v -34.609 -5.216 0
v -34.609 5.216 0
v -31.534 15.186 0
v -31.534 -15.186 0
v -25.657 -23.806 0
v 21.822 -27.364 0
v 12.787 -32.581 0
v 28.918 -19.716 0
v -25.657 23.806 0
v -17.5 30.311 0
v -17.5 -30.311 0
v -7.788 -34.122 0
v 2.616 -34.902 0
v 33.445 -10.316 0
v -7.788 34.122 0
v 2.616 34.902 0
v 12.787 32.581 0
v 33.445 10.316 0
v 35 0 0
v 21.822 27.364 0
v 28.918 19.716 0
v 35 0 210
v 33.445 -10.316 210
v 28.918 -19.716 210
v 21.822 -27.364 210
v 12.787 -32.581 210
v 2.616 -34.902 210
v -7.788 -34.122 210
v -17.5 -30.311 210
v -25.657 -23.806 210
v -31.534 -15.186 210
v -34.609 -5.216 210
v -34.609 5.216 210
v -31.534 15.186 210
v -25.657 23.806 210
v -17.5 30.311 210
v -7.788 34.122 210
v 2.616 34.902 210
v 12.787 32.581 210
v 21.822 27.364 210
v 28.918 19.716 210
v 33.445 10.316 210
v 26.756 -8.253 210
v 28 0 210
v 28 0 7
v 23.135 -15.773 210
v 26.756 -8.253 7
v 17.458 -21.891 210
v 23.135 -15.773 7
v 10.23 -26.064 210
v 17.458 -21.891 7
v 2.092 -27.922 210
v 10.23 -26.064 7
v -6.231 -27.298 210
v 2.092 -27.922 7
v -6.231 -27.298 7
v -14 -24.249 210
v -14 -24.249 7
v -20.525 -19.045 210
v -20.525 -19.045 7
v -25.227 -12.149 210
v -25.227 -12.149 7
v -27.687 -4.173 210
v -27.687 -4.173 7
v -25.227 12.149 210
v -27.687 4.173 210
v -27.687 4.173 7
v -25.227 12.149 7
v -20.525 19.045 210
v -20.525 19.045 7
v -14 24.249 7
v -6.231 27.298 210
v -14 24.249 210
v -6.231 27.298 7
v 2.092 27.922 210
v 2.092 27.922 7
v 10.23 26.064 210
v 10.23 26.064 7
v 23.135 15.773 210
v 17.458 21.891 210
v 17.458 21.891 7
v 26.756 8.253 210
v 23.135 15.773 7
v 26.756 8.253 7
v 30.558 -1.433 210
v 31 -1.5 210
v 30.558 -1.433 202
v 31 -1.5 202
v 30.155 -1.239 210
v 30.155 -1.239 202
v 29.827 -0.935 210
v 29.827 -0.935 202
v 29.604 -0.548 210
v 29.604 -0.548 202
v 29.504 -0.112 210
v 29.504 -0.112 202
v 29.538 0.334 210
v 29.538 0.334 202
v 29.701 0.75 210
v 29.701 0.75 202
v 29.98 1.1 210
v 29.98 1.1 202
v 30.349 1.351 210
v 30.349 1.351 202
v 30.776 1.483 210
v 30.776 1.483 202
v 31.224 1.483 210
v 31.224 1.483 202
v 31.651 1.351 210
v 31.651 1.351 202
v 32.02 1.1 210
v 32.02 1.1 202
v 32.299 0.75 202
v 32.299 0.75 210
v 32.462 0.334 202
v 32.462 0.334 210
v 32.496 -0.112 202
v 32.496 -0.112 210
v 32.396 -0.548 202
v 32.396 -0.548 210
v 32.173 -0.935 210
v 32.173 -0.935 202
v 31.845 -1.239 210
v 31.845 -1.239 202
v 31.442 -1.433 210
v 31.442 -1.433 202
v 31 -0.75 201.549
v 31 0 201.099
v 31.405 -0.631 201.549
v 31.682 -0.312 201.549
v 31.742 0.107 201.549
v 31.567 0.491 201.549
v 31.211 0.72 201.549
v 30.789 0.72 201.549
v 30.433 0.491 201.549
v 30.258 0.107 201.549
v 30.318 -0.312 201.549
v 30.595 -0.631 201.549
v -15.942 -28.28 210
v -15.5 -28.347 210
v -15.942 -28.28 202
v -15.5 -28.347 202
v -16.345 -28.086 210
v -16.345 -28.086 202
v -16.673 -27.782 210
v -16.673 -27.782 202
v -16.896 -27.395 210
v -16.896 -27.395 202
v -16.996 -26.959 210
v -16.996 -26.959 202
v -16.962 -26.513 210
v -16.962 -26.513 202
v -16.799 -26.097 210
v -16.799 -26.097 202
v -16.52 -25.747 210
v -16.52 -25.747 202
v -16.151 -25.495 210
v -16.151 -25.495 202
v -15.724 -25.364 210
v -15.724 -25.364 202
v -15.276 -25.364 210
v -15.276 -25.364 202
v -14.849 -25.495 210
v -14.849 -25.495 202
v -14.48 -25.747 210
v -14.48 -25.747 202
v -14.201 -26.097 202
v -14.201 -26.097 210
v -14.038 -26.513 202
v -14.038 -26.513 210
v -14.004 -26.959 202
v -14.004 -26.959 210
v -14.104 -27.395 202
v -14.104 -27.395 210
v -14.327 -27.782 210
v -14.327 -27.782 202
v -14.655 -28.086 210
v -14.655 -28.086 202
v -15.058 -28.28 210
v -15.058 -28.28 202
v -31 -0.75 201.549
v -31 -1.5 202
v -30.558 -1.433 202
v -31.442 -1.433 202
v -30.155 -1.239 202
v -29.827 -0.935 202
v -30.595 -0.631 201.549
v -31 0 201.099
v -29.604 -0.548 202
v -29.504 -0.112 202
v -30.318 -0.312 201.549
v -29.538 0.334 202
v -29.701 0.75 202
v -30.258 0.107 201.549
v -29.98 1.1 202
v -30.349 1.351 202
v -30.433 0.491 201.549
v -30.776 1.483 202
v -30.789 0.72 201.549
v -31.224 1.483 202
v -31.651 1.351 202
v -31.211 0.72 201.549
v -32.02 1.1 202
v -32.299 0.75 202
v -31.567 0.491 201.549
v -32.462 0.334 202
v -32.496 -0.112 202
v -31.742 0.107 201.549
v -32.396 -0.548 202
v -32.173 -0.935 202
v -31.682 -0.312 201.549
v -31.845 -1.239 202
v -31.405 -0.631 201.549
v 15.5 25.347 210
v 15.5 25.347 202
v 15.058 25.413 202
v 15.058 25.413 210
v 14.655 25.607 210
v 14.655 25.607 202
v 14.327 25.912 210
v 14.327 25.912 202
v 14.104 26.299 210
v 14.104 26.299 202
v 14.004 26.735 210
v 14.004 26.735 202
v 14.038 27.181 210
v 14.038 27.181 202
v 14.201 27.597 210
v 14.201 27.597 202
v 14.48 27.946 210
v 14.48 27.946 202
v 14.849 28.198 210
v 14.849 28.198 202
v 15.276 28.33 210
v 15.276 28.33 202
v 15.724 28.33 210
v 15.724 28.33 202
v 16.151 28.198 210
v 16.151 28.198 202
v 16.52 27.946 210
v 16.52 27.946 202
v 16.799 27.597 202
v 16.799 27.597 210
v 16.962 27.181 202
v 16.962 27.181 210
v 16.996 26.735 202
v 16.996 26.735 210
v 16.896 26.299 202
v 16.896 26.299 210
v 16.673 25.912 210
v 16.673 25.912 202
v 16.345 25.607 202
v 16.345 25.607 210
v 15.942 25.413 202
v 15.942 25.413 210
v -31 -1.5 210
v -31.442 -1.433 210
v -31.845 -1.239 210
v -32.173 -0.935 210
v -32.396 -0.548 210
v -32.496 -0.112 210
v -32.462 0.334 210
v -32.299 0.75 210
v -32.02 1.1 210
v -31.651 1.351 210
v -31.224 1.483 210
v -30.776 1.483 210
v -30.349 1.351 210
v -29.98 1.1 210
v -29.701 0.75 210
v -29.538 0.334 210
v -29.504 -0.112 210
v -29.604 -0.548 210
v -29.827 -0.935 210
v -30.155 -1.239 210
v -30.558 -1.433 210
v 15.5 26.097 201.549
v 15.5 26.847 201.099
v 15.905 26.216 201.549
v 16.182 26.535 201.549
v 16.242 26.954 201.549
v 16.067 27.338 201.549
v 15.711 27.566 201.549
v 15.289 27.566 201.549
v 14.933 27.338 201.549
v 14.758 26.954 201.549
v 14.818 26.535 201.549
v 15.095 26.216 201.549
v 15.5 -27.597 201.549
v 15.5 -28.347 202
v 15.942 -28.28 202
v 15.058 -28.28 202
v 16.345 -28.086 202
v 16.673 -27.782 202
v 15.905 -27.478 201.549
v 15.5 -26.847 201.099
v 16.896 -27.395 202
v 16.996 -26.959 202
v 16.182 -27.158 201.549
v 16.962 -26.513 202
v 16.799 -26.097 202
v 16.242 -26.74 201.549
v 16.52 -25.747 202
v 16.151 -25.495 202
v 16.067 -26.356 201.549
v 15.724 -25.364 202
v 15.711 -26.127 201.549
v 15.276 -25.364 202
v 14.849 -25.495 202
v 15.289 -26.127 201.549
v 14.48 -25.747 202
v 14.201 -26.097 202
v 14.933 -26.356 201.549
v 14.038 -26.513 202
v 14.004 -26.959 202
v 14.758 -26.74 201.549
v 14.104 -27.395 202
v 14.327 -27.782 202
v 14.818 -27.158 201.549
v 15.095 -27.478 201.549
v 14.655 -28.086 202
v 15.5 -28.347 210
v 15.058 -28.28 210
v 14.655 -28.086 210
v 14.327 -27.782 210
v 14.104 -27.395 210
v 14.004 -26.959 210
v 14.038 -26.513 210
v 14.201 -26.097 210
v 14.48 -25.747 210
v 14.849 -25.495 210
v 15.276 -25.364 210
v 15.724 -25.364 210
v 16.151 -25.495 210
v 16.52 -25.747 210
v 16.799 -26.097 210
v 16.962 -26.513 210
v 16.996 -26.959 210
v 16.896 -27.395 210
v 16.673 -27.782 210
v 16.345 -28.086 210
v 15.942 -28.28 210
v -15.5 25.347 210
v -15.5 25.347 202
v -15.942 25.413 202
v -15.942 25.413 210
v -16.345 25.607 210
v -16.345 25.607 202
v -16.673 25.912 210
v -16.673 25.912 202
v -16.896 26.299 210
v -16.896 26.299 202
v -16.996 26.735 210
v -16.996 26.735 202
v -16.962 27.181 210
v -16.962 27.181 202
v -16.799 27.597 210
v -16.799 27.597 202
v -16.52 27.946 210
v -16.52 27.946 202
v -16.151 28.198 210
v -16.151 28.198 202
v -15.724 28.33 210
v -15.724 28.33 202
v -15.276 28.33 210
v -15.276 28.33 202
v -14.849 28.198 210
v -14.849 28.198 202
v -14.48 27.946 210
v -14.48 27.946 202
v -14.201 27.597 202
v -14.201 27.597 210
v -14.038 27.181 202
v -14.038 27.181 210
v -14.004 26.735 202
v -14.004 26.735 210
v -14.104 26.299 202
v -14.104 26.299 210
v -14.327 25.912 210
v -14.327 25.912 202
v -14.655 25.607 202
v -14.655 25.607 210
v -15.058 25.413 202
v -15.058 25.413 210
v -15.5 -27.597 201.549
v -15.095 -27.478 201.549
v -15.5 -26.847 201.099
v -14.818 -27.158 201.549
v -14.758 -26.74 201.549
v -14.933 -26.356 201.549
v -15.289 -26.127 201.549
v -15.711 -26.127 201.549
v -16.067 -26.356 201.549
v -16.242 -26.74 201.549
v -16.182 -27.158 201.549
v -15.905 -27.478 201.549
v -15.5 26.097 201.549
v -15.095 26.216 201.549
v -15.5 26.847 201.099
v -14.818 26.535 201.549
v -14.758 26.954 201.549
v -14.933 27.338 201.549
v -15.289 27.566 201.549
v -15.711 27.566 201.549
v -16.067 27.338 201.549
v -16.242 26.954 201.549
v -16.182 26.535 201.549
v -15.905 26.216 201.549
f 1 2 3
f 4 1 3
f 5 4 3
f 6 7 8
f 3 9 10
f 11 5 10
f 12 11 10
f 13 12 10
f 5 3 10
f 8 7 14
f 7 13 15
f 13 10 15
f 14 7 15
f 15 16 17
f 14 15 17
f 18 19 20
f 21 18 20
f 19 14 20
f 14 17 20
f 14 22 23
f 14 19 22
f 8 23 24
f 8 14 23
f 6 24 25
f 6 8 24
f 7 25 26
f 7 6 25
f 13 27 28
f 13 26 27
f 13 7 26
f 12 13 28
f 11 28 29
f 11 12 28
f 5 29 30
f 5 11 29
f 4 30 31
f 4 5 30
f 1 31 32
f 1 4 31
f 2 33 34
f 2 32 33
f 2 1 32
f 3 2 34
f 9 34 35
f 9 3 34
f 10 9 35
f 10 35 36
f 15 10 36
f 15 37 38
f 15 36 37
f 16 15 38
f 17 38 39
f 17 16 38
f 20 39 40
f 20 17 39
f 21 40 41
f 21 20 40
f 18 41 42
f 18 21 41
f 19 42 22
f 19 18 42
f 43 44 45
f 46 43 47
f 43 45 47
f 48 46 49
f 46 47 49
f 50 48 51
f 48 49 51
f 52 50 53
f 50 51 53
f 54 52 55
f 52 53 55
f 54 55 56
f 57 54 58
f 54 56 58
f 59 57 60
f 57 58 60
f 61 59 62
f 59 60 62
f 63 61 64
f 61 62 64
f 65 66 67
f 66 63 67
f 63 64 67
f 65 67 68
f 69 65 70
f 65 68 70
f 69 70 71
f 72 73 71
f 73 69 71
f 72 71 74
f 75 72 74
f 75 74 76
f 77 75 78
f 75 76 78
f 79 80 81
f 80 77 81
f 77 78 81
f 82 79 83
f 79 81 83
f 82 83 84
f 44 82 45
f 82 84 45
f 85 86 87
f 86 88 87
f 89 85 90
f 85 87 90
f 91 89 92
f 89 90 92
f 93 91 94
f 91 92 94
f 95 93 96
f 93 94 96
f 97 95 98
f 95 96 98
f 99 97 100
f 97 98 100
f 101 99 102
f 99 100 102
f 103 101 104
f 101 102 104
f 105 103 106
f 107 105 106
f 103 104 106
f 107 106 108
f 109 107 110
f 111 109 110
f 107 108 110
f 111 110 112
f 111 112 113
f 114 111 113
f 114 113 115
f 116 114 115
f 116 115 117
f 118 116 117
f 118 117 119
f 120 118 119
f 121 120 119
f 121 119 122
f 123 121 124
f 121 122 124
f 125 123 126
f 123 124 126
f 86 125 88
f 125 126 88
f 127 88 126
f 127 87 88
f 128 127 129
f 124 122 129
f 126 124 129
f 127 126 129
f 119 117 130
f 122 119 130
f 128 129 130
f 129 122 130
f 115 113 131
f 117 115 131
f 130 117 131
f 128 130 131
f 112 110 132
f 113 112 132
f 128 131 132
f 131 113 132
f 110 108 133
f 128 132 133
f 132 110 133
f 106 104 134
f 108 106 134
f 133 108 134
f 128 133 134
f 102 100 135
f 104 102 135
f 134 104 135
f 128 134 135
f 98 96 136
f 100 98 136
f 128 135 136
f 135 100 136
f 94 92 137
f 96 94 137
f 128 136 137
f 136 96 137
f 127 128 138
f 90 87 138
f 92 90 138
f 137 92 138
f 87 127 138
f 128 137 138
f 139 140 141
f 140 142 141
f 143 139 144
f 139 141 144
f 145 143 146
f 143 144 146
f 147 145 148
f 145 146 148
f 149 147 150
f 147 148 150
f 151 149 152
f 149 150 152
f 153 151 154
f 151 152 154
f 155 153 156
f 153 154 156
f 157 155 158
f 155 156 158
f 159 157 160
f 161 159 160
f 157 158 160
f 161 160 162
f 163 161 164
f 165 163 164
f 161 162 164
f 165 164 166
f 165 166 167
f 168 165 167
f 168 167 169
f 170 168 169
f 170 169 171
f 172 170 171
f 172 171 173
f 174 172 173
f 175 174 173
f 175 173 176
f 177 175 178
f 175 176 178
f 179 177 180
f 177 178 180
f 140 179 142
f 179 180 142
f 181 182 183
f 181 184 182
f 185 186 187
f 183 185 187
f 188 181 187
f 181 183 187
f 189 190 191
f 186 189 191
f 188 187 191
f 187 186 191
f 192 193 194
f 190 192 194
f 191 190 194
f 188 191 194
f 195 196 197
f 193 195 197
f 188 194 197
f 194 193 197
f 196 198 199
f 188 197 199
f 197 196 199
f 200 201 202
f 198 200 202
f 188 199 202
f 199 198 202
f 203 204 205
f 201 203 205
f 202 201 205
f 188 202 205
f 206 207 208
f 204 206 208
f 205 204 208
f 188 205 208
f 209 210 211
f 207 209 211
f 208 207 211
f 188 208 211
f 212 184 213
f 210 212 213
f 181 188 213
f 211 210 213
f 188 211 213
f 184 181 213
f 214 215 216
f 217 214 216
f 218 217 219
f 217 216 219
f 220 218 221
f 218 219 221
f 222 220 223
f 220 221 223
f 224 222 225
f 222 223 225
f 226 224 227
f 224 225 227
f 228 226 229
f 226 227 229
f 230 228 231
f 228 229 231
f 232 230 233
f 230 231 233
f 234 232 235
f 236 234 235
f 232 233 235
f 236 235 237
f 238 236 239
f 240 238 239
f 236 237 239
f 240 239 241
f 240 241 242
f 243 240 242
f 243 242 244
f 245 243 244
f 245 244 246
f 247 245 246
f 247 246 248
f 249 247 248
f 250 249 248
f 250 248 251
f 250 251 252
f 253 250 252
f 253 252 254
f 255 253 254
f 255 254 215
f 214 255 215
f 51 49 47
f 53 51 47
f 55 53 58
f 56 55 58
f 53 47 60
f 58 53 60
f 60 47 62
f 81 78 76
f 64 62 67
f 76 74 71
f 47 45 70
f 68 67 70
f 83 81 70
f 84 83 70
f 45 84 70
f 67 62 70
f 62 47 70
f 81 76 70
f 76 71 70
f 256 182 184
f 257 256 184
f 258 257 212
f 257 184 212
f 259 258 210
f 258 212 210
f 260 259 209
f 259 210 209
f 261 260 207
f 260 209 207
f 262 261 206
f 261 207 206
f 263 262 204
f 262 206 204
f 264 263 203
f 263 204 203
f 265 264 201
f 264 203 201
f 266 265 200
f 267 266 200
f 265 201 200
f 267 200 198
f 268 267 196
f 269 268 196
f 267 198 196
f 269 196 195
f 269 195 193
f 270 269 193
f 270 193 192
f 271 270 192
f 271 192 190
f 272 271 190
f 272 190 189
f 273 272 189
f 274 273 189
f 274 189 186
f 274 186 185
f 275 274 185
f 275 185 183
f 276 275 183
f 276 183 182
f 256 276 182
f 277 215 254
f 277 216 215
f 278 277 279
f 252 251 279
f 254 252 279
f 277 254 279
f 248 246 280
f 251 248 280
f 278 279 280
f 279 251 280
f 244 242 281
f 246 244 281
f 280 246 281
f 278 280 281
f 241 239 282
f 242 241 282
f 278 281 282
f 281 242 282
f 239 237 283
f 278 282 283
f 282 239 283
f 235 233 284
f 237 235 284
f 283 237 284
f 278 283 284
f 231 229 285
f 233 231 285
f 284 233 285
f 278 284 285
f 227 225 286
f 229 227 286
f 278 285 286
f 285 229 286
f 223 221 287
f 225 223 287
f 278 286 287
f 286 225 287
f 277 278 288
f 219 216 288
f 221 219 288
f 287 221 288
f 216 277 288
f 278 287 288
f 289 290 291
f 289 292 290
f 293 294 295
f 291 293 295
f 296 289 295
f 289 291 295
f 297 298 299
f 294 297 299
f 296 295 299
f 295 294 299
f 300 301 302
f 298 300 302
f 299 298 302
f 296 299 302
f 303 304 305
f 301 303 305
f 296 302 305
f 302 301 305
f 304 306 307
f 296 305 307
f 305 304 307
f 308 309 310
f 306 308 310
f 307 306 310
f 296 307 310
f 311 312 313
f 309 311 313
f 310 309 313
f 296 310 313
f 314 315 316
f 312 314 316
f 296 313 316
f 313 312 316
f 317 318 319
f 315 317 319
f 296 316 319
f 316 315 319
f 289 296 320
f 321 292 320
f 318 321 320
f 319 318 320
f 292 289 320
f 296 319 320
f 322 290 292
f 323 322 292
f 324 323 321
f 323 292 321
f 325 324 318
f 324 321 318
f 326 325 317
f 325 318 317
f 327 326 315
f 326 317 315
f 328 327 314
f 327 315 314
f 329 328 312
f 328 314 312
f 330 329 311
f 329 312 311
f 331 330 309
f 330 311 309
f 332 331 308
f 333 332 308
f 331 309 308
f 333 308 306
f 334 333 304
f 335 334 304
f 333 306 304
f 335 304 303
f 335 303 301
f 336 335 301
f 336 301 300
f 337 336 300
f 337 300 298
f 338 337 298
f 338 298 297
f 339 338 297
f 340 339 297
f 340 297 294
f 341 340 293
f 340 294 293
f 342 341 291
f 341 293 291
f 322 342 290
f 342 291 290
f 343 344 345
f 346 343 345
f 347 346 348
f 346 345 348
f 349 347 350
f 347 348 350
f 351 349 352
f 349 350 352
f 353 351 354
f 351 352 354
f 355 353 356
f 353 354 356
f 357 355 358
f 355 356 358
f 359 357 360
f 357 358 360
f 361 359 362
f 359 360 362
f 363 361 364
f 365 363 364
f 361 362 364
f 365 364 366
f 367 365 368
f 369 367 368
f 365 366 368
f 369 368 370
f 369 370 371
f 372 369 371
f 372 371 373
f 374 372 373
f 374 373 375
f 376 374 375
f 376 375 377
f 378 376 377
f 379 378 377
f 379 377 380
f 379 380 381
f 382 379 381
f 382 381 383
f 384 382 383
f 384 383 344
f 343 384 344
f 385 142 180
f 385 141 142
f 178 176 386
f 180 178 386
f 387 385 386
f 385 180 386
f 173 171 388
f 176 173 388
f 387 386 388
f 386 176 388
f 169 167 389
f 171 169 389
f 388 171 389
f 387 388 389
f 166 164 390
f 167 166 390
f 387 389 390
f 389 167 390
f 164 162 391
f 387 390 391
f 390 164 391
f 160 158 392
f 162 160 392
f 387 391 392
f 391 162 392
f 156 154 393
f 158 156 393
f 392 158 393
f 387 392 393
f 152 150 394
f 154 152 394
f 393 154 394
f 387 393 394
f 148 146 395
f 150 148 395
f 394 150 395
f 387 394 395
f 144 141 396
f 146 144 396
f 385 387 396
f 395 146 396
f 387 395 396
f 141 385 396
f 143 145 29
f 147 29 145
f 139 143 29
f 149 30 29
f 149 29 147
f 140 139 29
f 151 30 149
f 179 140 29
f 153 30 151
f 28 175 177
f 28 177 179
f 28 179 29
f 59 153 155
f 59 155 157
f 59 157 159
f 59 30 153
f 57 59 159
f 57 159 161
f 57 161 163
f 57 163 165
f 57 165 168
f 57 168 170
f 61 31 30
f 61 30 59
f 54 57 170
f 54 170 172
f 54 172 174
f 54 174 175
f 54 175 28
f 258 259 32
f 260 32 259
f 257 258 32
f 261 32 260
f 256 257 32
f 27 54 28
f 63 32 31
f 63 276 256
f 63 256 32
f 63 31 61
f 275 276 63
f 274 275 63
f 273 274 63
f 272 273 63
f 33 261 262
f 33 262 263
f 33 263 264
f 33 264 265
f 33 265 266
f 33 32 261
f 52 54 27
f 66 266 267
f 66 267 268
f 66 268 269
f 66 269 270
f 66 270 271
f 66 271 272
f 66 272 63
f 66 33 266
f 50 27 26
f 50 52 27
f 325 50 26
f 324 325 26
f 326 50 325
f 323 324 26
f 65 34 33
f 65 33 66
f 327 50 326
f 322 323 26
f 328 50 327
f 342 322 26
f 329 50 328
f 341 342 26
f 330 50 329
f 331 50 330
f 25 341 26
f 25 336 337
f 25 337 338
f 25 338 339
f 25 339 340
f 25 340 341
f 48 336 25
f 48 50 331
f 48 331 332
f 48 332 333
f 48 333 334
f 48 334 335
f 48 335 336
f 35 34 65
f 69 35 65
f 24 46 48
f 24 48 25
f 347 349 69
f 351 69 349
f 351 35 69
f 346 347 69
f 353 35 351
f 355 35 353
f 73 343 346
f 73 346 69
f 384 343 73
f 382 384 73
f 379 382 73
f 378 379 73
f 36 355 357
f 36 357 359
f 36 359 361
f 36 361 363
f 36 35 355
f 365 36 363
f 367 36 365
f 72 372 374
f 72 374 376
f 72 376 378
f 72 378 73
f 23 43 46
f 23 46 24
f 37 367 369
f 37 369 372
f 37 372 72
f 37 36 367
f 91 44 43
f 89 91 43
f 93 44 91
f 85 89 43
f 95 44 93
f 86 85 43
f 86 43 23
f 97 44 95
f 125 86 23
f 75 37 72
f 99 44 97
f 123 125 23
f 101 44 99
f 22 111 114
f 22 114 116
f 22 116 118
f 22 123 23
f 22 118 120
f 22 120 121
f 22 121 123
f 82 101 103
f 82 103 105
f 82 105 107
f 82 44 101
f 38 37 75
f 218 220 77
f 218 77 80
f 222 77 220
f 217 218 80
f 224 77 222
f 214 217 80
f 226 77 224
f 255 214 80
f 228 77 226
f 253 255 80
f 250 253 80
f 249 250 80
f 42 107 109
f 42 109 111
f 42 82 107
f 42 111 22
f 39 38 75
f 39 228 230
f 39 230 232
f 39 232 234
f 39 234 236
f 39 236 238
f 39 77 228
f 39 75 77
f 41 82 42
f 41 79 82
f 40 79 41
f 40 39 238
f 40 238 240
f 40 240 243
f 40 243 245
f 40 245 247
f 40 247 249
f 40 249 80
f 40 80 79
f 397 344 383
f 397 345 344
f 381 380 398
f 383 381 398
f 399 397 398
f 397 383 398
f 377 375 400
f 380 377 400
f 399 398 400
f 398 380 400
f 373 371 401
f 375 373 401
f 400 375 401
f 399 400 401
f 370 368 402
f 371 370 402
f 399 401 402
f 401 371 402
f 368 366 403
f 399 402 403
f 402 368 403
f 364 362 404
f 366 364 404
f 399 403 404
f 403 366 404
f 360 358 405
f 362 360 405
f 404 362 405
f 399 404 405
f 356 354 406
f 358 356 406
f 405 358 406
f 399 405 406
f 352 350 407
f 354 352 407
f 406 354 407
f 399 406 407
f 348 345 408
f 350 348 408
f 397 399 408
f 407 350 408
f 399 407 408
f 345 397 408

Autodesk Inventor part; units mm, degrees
ref_plane "YZ Plane" through (0, 0, 0) normal (1, 0, 0) x (0, 1, 0)
ref_plane "XZ Plane" through (0, 0, 0) normal (0, 1, 0) x (-1, 0, 0)
ref_plane "XY Plane" through (0, 0, 0) normal (0, 0, 1) x (1, 0, 0)
sketch "Sketch1" plane through (0, 0, 0) normal (0, 0, 1) x (1, 0, 0)
  circle A0 centre (0, 0) radius 35
  circle A1 centre (0, 0) radius 28
  dimension "d0" = 70
  dimension "d1" = 56
extrude "Extrusion1" add sketch "Sketch1" along normal blind 210
sketch "Sketch2" plane through (0, 0, 0) normal (0, 0, -1) x (-1, 0, 0)
  circle A0 centre (0, 0) radius 31.5
extrude "Extrusion2" add sketch "Sketch2" against normal blind 7
sketch "Sketch3" plane through (0, 0, 210) normal (0, 0, 1) x (1, 0, 0)
  circle A0 centre (0, 0) radius 35 projected
  line L0 (35, 0) -> (17.5, -30.3109)
  line L1 (17.5, -30.3109) -> (-17.5, -30.3109)
  line L2 (-17.5, -30.3109) -> (-35, 0)
  line L3 (-35, 0) -> (-17.5, 30.3109)
  line L4 (-17.5, 30.3109) -> (17.5, 30.3109)
  line L5 (17.5, 30.3109) -> (35, 0)
  line L6 (-17.5, 30.3109) -> (17.5, -30.3109)
  line L7 (-17.5, -30.3109) -> (17.5, 30.3109)
  line L8 (-35, 0) -> (35, 0)
  line L9 (-17.5, 30.3109) -> (-15.5, 26.8468)
  line L10 (17.5, 30.3109) -> (15.5, 26.8468)
  line L11 (35, 0) -> (31, 0)
  line L12 (17.5, -30.3109) -> (15.5, -26.8468)
  line L13 (-17.5, -30.3109) -> (-15.5, -26.8468)
  line L14 (-35, 0) -> (-31, 0)
  dimension "d6" = 4
  dimension "d7" = 4
  dimension "d8" = 4
  dimension "d9" = 4
  dimension "d10" = 4
  dimension "d11" = 4
hole "Hole1" at (-15.5, 26.8468, 210) at (-31, 0, 210) at (-15.5, -26.8468, 210) at (15.5, 26.8468, 210) at (31, 0, 210) at (15.5, -26.8468, 210) direction (0, 0, -1) diameter 3 depth 8 tip angle 118
properties part number "battery_Tube"
